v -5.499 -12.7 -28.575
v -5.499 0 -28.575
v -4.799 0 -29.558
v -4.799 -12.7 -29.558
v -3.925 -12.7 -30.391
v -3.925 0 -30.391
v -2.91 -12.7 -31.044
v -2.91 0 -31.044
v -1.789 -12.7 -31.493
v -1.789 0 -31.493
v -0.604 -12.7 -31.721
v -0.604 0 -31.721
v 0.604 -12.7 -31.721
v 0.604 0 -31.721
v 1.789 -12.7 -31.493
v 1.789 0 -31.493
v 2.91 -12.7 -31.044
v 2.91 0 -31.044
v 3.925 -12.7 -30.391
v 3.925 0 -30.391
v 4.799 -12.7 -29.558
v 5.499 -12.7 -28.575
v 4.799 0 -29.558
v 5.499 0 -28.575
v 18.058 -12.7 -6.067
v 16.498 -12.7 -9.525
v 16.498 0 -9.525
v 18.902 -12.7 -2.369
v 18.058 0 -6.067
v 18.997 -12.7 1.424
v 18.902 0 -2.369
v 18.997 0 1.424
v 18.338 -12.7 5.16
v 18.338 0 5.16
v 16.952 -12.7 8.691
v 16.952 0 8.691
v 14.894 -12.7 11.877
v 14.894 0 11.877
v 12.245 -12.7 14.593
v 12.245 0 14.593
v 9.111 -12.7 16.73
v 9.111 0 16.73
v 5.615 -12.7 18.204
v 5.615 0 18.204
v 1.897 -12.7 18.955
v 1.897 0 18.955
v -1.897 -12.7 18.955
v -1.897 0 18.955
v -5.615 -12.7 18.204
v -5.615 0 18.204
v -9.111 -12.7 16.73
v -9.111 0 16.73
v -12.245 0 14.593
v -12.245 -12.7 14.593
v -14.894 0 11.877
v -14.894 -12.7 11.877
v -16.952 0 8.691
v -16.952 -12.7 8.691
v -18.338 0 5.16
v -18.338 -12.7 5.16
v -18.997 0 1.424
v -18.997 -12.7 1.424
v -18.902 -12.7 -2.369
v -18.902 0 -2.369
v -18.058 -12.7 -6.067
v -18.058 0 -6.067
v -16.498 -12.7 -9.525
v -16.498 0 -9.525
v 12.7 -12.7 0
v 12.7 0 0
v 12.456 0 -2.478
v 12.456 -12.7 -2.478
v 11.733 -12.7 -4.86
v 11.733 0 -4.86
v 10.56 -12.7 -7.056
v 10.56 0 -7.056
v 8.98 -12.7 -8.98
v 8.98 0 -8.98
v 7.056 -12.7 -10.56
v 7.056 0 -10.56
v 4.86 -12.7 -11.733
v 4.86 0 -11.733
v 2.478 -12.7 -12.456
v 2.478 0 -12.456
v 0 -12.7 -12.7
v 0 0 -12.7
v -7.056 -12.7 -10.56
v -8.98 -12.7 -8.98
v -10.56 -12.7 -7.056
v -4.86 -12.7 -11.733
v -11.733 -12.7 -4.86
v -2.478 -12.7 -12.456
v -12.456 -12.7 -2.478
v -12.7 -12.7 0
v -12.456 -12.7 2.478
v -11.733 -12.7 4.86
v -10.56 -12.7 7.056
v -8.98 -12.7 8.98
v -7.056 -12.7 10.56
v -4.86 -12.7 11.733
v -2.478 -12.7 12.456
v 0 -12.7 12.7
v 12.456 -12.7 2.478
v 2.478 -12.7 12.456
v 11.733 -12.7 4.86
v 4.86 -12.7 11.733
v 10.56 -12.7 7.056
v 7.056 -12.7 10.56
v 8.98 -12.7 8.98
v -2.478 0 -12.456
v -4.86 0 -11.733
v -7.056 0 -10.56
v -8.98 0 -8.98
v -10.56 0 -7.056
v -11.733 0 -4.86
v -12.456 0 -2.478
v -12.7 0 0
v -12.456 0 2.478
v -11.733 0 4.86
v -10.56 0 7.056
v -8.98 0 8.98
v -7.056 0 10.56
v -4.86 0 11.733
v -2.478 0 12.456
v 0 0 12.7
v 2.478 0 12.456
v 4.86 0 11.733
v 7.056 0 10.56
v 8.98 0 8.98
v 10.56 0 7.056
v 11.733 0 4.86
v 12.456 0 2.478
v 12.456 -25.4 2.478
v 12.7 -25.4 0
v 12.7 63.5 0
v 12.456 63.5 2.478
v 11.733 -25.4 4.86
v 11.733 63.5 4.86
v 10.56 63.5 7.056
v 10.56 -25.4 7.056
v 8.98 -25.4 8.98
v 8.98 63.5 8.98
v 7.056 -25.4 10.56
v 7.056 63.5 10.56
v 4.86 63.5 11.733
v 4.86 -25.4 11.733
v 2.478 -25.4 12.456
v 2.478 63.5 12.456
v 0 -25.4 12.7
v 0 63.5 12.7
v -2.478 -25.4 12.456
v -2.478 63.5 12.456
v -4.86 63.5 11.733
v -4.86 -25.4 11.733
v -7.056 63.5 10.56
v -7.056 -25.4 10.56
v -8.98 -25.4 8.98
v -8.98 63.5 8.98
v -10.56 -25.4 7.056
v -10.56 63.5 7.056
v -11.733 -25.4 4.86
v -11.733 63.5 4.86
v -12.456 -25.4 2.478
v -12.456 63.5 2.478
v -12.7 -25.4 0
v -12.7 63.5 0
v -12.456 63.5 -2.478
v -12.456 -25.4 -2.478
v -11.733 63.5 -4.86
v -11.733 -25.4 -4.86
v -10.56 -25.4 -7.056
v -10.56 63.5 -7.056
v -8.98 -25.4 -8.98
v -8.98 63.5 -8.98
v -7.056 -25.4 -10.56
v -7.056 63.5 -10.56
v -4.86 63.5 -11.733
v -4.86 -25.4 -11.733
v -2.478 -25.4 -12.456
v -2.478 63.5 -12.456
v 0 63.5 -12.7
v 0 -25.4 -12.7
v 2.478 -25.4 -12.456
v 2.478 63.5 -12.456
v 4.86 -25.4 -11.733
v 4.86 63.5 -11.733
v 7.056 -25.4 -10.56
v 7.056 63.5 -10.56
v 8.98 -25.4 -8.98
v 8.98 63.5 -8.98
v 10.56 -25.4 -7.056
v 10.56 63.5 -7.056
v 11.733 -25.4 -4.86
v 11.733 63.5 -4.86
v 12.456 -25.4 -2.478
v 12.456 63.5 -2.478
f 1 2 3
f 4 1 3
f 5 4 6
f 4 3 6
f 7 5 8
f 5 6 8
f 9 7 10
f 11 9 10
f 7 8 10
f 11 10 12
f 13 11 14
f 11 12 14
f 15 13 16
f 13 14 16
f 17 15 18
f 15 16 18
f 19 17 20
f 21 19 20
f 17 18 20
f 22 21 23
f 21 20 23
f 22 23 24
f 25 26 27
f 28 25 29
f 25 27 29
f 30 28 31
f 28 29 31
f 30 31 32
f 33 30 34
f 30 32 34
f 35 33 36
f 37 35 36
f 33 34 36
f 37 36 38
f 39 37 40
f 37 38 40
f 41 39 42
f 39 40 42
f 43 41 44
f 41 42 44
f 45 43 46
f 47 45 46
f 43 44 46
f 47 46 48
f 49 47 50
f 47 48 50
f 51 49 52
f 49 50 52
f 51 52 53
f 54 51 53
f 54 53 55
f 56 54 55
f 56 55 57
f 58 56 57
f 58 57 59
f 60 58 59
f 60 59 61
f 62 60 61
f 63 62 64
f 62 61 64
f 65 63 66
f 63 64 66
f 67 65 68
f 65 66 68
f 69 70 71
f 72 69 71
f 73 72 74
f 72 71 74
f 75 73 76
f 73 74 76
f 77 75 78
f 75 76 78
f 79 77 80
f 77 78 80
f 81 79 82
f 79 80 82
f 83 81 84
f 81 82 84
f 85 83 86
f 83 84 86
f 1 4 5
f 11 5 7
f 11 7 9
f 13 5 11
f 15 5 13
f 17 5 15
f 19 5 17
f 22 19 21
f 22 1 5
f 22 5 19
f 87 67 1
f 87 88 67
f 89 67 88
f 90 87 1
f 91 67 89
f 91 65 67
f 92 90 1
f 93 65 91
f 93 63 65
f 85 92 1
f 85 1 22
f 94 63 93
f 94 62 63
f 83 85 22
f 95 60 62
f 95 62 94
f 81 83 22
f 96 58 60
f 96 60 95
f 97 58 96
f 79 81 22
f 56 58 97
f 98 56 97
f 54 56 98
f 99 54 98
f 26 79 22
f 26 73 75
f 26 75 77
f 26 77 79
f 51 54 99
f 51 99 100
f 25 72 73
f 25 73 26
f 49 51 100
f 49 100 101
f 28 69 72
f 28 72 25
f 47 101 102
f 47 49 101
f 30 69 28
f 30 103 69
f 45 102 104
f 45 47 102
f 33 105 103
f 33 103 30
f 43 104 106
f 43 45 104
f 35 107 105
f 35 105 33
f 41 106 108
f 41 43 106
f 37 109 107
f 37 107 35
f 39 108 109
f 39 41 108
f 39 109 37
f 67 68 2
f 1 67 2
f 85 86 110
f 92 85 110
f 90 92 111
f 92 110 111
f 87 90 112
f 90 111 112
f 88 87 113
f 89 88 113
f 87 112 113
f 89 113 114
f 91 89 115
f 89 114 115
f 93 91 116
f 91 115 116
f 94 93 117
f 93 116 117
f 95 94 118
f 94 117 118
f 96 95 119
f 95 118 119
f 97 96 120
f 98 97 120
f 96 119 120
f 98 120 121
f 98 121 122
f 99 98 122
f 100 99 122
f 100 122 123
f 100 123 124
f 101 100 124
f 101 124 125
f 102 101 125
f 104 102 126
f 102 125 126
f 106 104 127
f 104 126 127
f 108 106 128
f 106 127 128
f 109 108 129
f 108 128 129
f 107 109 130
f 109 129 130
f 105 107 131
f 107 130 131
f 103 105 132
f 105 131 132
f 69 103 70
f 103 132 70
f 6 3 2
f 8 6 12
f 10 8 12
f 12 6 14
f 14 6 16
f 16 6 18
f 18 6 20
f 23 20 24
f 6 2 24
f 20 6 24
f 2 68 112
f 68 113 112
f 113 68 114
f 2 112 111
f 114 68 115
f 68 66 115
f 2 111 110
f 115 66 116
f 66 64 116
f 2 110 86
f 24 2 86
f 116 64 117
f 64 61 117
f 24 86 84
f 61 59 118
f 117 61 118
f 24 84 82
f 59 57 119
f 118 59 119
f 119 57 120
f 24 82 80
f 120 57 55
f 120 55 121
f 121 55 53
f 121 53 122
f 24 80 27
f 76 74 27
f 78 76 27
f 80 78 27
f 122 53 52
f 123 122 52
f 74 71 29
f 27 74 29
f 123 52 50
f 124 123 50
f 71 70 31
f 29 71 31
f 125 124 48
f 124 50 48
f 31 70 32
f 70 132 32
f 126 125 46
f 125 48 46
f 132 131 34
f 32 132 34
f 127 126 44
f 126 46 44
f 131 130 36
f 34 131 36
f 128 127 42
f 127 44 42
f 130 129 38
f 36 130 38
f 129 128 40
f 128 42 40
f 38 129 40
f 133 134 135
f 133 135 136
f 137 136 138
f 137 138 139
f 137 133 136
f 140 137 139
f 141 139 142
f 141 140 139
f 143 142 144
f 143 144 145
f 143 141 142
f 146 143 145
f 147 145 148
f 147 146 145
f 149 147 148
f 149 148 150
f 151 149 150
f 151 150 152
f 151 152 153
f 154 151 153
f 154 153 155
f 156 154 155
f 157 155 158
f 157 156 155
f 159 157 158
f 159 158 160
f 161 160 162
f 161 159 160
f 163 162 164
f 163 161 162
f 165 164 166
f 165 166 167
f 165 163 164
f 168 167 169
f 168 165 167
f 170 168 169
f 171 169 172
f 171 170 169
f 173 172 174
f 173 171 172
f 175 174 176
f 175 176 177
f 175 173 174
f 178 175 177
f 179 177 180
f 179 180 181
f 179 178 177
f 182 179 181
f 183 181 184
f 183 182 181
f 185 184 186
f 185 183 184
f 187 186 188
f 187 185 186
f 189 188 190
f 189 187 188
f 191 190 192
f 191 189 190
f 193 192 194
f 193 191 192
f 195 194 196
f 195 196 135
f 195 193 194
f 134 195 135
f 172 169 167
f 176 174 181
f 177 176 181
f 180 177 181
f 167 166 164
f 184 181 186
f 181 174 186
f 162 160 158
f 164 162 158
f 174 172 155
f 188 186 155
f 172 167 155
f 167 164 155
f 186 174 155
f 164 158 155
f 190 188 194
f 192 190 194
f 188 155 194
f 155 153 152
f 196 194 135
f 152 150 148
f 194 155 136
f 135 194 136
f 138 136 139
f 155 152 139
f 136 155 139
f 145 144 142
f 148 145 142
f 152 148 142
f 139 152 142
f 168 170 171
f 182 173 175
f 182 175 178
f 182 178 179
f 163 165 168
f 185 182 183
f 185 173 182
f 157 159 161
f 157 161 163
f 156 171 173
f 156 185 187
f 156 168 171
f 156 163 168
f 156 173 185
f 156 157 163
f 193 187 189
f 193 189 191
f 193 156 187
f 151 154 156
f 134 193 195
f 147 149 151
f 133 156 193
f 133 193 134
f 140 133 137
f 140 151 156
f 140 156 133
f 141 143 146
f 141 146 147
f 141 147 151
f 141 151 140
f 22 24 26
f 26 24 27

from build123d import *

# Parameters (mm, degrees)
F1_DEPTH = 12.7
F3_R     = 12.7
F4_DEPTH = 88.9


with BuildPart() as f1:
    # F0 (on Front) → F1 (new body)
    with BuildSketch(Plane.XZ):
        with BuildLine():
            Line((5.499261, -28.575), (16.497784, -9.525))
            ThreePointArc((16.497784, -9.525), (0, 19.05), (-16.497784, -9.525))
            Line((-16.497784, -9.525), (-5.499261, -28.575))
            ThreePointArc((-5.499261, -28.575), (0, -31.75), (5.499261, -28.575))
        make_face()
        with BuildLine():
            ThreePointArc((0, -12.7), (-8.980256, 8.980256), (12.7, 0))
            ThreePointArc((12.7, 0), (8.980256, -8.980256), (0, -12.7))
        make_face(mode=Mode.SUBTRACT)
    extrude(amount=F1_DEPTH)


with BuildPart() as f4:
    # F3 (on offset) → F4 (new body)
    with BuildSketch(Plane.XZ.offset(25.4)):
        Circle(F3_R)
    extrude(amount=-F4_DEPTH)


solid = Compound([f1.part, f4.part])
